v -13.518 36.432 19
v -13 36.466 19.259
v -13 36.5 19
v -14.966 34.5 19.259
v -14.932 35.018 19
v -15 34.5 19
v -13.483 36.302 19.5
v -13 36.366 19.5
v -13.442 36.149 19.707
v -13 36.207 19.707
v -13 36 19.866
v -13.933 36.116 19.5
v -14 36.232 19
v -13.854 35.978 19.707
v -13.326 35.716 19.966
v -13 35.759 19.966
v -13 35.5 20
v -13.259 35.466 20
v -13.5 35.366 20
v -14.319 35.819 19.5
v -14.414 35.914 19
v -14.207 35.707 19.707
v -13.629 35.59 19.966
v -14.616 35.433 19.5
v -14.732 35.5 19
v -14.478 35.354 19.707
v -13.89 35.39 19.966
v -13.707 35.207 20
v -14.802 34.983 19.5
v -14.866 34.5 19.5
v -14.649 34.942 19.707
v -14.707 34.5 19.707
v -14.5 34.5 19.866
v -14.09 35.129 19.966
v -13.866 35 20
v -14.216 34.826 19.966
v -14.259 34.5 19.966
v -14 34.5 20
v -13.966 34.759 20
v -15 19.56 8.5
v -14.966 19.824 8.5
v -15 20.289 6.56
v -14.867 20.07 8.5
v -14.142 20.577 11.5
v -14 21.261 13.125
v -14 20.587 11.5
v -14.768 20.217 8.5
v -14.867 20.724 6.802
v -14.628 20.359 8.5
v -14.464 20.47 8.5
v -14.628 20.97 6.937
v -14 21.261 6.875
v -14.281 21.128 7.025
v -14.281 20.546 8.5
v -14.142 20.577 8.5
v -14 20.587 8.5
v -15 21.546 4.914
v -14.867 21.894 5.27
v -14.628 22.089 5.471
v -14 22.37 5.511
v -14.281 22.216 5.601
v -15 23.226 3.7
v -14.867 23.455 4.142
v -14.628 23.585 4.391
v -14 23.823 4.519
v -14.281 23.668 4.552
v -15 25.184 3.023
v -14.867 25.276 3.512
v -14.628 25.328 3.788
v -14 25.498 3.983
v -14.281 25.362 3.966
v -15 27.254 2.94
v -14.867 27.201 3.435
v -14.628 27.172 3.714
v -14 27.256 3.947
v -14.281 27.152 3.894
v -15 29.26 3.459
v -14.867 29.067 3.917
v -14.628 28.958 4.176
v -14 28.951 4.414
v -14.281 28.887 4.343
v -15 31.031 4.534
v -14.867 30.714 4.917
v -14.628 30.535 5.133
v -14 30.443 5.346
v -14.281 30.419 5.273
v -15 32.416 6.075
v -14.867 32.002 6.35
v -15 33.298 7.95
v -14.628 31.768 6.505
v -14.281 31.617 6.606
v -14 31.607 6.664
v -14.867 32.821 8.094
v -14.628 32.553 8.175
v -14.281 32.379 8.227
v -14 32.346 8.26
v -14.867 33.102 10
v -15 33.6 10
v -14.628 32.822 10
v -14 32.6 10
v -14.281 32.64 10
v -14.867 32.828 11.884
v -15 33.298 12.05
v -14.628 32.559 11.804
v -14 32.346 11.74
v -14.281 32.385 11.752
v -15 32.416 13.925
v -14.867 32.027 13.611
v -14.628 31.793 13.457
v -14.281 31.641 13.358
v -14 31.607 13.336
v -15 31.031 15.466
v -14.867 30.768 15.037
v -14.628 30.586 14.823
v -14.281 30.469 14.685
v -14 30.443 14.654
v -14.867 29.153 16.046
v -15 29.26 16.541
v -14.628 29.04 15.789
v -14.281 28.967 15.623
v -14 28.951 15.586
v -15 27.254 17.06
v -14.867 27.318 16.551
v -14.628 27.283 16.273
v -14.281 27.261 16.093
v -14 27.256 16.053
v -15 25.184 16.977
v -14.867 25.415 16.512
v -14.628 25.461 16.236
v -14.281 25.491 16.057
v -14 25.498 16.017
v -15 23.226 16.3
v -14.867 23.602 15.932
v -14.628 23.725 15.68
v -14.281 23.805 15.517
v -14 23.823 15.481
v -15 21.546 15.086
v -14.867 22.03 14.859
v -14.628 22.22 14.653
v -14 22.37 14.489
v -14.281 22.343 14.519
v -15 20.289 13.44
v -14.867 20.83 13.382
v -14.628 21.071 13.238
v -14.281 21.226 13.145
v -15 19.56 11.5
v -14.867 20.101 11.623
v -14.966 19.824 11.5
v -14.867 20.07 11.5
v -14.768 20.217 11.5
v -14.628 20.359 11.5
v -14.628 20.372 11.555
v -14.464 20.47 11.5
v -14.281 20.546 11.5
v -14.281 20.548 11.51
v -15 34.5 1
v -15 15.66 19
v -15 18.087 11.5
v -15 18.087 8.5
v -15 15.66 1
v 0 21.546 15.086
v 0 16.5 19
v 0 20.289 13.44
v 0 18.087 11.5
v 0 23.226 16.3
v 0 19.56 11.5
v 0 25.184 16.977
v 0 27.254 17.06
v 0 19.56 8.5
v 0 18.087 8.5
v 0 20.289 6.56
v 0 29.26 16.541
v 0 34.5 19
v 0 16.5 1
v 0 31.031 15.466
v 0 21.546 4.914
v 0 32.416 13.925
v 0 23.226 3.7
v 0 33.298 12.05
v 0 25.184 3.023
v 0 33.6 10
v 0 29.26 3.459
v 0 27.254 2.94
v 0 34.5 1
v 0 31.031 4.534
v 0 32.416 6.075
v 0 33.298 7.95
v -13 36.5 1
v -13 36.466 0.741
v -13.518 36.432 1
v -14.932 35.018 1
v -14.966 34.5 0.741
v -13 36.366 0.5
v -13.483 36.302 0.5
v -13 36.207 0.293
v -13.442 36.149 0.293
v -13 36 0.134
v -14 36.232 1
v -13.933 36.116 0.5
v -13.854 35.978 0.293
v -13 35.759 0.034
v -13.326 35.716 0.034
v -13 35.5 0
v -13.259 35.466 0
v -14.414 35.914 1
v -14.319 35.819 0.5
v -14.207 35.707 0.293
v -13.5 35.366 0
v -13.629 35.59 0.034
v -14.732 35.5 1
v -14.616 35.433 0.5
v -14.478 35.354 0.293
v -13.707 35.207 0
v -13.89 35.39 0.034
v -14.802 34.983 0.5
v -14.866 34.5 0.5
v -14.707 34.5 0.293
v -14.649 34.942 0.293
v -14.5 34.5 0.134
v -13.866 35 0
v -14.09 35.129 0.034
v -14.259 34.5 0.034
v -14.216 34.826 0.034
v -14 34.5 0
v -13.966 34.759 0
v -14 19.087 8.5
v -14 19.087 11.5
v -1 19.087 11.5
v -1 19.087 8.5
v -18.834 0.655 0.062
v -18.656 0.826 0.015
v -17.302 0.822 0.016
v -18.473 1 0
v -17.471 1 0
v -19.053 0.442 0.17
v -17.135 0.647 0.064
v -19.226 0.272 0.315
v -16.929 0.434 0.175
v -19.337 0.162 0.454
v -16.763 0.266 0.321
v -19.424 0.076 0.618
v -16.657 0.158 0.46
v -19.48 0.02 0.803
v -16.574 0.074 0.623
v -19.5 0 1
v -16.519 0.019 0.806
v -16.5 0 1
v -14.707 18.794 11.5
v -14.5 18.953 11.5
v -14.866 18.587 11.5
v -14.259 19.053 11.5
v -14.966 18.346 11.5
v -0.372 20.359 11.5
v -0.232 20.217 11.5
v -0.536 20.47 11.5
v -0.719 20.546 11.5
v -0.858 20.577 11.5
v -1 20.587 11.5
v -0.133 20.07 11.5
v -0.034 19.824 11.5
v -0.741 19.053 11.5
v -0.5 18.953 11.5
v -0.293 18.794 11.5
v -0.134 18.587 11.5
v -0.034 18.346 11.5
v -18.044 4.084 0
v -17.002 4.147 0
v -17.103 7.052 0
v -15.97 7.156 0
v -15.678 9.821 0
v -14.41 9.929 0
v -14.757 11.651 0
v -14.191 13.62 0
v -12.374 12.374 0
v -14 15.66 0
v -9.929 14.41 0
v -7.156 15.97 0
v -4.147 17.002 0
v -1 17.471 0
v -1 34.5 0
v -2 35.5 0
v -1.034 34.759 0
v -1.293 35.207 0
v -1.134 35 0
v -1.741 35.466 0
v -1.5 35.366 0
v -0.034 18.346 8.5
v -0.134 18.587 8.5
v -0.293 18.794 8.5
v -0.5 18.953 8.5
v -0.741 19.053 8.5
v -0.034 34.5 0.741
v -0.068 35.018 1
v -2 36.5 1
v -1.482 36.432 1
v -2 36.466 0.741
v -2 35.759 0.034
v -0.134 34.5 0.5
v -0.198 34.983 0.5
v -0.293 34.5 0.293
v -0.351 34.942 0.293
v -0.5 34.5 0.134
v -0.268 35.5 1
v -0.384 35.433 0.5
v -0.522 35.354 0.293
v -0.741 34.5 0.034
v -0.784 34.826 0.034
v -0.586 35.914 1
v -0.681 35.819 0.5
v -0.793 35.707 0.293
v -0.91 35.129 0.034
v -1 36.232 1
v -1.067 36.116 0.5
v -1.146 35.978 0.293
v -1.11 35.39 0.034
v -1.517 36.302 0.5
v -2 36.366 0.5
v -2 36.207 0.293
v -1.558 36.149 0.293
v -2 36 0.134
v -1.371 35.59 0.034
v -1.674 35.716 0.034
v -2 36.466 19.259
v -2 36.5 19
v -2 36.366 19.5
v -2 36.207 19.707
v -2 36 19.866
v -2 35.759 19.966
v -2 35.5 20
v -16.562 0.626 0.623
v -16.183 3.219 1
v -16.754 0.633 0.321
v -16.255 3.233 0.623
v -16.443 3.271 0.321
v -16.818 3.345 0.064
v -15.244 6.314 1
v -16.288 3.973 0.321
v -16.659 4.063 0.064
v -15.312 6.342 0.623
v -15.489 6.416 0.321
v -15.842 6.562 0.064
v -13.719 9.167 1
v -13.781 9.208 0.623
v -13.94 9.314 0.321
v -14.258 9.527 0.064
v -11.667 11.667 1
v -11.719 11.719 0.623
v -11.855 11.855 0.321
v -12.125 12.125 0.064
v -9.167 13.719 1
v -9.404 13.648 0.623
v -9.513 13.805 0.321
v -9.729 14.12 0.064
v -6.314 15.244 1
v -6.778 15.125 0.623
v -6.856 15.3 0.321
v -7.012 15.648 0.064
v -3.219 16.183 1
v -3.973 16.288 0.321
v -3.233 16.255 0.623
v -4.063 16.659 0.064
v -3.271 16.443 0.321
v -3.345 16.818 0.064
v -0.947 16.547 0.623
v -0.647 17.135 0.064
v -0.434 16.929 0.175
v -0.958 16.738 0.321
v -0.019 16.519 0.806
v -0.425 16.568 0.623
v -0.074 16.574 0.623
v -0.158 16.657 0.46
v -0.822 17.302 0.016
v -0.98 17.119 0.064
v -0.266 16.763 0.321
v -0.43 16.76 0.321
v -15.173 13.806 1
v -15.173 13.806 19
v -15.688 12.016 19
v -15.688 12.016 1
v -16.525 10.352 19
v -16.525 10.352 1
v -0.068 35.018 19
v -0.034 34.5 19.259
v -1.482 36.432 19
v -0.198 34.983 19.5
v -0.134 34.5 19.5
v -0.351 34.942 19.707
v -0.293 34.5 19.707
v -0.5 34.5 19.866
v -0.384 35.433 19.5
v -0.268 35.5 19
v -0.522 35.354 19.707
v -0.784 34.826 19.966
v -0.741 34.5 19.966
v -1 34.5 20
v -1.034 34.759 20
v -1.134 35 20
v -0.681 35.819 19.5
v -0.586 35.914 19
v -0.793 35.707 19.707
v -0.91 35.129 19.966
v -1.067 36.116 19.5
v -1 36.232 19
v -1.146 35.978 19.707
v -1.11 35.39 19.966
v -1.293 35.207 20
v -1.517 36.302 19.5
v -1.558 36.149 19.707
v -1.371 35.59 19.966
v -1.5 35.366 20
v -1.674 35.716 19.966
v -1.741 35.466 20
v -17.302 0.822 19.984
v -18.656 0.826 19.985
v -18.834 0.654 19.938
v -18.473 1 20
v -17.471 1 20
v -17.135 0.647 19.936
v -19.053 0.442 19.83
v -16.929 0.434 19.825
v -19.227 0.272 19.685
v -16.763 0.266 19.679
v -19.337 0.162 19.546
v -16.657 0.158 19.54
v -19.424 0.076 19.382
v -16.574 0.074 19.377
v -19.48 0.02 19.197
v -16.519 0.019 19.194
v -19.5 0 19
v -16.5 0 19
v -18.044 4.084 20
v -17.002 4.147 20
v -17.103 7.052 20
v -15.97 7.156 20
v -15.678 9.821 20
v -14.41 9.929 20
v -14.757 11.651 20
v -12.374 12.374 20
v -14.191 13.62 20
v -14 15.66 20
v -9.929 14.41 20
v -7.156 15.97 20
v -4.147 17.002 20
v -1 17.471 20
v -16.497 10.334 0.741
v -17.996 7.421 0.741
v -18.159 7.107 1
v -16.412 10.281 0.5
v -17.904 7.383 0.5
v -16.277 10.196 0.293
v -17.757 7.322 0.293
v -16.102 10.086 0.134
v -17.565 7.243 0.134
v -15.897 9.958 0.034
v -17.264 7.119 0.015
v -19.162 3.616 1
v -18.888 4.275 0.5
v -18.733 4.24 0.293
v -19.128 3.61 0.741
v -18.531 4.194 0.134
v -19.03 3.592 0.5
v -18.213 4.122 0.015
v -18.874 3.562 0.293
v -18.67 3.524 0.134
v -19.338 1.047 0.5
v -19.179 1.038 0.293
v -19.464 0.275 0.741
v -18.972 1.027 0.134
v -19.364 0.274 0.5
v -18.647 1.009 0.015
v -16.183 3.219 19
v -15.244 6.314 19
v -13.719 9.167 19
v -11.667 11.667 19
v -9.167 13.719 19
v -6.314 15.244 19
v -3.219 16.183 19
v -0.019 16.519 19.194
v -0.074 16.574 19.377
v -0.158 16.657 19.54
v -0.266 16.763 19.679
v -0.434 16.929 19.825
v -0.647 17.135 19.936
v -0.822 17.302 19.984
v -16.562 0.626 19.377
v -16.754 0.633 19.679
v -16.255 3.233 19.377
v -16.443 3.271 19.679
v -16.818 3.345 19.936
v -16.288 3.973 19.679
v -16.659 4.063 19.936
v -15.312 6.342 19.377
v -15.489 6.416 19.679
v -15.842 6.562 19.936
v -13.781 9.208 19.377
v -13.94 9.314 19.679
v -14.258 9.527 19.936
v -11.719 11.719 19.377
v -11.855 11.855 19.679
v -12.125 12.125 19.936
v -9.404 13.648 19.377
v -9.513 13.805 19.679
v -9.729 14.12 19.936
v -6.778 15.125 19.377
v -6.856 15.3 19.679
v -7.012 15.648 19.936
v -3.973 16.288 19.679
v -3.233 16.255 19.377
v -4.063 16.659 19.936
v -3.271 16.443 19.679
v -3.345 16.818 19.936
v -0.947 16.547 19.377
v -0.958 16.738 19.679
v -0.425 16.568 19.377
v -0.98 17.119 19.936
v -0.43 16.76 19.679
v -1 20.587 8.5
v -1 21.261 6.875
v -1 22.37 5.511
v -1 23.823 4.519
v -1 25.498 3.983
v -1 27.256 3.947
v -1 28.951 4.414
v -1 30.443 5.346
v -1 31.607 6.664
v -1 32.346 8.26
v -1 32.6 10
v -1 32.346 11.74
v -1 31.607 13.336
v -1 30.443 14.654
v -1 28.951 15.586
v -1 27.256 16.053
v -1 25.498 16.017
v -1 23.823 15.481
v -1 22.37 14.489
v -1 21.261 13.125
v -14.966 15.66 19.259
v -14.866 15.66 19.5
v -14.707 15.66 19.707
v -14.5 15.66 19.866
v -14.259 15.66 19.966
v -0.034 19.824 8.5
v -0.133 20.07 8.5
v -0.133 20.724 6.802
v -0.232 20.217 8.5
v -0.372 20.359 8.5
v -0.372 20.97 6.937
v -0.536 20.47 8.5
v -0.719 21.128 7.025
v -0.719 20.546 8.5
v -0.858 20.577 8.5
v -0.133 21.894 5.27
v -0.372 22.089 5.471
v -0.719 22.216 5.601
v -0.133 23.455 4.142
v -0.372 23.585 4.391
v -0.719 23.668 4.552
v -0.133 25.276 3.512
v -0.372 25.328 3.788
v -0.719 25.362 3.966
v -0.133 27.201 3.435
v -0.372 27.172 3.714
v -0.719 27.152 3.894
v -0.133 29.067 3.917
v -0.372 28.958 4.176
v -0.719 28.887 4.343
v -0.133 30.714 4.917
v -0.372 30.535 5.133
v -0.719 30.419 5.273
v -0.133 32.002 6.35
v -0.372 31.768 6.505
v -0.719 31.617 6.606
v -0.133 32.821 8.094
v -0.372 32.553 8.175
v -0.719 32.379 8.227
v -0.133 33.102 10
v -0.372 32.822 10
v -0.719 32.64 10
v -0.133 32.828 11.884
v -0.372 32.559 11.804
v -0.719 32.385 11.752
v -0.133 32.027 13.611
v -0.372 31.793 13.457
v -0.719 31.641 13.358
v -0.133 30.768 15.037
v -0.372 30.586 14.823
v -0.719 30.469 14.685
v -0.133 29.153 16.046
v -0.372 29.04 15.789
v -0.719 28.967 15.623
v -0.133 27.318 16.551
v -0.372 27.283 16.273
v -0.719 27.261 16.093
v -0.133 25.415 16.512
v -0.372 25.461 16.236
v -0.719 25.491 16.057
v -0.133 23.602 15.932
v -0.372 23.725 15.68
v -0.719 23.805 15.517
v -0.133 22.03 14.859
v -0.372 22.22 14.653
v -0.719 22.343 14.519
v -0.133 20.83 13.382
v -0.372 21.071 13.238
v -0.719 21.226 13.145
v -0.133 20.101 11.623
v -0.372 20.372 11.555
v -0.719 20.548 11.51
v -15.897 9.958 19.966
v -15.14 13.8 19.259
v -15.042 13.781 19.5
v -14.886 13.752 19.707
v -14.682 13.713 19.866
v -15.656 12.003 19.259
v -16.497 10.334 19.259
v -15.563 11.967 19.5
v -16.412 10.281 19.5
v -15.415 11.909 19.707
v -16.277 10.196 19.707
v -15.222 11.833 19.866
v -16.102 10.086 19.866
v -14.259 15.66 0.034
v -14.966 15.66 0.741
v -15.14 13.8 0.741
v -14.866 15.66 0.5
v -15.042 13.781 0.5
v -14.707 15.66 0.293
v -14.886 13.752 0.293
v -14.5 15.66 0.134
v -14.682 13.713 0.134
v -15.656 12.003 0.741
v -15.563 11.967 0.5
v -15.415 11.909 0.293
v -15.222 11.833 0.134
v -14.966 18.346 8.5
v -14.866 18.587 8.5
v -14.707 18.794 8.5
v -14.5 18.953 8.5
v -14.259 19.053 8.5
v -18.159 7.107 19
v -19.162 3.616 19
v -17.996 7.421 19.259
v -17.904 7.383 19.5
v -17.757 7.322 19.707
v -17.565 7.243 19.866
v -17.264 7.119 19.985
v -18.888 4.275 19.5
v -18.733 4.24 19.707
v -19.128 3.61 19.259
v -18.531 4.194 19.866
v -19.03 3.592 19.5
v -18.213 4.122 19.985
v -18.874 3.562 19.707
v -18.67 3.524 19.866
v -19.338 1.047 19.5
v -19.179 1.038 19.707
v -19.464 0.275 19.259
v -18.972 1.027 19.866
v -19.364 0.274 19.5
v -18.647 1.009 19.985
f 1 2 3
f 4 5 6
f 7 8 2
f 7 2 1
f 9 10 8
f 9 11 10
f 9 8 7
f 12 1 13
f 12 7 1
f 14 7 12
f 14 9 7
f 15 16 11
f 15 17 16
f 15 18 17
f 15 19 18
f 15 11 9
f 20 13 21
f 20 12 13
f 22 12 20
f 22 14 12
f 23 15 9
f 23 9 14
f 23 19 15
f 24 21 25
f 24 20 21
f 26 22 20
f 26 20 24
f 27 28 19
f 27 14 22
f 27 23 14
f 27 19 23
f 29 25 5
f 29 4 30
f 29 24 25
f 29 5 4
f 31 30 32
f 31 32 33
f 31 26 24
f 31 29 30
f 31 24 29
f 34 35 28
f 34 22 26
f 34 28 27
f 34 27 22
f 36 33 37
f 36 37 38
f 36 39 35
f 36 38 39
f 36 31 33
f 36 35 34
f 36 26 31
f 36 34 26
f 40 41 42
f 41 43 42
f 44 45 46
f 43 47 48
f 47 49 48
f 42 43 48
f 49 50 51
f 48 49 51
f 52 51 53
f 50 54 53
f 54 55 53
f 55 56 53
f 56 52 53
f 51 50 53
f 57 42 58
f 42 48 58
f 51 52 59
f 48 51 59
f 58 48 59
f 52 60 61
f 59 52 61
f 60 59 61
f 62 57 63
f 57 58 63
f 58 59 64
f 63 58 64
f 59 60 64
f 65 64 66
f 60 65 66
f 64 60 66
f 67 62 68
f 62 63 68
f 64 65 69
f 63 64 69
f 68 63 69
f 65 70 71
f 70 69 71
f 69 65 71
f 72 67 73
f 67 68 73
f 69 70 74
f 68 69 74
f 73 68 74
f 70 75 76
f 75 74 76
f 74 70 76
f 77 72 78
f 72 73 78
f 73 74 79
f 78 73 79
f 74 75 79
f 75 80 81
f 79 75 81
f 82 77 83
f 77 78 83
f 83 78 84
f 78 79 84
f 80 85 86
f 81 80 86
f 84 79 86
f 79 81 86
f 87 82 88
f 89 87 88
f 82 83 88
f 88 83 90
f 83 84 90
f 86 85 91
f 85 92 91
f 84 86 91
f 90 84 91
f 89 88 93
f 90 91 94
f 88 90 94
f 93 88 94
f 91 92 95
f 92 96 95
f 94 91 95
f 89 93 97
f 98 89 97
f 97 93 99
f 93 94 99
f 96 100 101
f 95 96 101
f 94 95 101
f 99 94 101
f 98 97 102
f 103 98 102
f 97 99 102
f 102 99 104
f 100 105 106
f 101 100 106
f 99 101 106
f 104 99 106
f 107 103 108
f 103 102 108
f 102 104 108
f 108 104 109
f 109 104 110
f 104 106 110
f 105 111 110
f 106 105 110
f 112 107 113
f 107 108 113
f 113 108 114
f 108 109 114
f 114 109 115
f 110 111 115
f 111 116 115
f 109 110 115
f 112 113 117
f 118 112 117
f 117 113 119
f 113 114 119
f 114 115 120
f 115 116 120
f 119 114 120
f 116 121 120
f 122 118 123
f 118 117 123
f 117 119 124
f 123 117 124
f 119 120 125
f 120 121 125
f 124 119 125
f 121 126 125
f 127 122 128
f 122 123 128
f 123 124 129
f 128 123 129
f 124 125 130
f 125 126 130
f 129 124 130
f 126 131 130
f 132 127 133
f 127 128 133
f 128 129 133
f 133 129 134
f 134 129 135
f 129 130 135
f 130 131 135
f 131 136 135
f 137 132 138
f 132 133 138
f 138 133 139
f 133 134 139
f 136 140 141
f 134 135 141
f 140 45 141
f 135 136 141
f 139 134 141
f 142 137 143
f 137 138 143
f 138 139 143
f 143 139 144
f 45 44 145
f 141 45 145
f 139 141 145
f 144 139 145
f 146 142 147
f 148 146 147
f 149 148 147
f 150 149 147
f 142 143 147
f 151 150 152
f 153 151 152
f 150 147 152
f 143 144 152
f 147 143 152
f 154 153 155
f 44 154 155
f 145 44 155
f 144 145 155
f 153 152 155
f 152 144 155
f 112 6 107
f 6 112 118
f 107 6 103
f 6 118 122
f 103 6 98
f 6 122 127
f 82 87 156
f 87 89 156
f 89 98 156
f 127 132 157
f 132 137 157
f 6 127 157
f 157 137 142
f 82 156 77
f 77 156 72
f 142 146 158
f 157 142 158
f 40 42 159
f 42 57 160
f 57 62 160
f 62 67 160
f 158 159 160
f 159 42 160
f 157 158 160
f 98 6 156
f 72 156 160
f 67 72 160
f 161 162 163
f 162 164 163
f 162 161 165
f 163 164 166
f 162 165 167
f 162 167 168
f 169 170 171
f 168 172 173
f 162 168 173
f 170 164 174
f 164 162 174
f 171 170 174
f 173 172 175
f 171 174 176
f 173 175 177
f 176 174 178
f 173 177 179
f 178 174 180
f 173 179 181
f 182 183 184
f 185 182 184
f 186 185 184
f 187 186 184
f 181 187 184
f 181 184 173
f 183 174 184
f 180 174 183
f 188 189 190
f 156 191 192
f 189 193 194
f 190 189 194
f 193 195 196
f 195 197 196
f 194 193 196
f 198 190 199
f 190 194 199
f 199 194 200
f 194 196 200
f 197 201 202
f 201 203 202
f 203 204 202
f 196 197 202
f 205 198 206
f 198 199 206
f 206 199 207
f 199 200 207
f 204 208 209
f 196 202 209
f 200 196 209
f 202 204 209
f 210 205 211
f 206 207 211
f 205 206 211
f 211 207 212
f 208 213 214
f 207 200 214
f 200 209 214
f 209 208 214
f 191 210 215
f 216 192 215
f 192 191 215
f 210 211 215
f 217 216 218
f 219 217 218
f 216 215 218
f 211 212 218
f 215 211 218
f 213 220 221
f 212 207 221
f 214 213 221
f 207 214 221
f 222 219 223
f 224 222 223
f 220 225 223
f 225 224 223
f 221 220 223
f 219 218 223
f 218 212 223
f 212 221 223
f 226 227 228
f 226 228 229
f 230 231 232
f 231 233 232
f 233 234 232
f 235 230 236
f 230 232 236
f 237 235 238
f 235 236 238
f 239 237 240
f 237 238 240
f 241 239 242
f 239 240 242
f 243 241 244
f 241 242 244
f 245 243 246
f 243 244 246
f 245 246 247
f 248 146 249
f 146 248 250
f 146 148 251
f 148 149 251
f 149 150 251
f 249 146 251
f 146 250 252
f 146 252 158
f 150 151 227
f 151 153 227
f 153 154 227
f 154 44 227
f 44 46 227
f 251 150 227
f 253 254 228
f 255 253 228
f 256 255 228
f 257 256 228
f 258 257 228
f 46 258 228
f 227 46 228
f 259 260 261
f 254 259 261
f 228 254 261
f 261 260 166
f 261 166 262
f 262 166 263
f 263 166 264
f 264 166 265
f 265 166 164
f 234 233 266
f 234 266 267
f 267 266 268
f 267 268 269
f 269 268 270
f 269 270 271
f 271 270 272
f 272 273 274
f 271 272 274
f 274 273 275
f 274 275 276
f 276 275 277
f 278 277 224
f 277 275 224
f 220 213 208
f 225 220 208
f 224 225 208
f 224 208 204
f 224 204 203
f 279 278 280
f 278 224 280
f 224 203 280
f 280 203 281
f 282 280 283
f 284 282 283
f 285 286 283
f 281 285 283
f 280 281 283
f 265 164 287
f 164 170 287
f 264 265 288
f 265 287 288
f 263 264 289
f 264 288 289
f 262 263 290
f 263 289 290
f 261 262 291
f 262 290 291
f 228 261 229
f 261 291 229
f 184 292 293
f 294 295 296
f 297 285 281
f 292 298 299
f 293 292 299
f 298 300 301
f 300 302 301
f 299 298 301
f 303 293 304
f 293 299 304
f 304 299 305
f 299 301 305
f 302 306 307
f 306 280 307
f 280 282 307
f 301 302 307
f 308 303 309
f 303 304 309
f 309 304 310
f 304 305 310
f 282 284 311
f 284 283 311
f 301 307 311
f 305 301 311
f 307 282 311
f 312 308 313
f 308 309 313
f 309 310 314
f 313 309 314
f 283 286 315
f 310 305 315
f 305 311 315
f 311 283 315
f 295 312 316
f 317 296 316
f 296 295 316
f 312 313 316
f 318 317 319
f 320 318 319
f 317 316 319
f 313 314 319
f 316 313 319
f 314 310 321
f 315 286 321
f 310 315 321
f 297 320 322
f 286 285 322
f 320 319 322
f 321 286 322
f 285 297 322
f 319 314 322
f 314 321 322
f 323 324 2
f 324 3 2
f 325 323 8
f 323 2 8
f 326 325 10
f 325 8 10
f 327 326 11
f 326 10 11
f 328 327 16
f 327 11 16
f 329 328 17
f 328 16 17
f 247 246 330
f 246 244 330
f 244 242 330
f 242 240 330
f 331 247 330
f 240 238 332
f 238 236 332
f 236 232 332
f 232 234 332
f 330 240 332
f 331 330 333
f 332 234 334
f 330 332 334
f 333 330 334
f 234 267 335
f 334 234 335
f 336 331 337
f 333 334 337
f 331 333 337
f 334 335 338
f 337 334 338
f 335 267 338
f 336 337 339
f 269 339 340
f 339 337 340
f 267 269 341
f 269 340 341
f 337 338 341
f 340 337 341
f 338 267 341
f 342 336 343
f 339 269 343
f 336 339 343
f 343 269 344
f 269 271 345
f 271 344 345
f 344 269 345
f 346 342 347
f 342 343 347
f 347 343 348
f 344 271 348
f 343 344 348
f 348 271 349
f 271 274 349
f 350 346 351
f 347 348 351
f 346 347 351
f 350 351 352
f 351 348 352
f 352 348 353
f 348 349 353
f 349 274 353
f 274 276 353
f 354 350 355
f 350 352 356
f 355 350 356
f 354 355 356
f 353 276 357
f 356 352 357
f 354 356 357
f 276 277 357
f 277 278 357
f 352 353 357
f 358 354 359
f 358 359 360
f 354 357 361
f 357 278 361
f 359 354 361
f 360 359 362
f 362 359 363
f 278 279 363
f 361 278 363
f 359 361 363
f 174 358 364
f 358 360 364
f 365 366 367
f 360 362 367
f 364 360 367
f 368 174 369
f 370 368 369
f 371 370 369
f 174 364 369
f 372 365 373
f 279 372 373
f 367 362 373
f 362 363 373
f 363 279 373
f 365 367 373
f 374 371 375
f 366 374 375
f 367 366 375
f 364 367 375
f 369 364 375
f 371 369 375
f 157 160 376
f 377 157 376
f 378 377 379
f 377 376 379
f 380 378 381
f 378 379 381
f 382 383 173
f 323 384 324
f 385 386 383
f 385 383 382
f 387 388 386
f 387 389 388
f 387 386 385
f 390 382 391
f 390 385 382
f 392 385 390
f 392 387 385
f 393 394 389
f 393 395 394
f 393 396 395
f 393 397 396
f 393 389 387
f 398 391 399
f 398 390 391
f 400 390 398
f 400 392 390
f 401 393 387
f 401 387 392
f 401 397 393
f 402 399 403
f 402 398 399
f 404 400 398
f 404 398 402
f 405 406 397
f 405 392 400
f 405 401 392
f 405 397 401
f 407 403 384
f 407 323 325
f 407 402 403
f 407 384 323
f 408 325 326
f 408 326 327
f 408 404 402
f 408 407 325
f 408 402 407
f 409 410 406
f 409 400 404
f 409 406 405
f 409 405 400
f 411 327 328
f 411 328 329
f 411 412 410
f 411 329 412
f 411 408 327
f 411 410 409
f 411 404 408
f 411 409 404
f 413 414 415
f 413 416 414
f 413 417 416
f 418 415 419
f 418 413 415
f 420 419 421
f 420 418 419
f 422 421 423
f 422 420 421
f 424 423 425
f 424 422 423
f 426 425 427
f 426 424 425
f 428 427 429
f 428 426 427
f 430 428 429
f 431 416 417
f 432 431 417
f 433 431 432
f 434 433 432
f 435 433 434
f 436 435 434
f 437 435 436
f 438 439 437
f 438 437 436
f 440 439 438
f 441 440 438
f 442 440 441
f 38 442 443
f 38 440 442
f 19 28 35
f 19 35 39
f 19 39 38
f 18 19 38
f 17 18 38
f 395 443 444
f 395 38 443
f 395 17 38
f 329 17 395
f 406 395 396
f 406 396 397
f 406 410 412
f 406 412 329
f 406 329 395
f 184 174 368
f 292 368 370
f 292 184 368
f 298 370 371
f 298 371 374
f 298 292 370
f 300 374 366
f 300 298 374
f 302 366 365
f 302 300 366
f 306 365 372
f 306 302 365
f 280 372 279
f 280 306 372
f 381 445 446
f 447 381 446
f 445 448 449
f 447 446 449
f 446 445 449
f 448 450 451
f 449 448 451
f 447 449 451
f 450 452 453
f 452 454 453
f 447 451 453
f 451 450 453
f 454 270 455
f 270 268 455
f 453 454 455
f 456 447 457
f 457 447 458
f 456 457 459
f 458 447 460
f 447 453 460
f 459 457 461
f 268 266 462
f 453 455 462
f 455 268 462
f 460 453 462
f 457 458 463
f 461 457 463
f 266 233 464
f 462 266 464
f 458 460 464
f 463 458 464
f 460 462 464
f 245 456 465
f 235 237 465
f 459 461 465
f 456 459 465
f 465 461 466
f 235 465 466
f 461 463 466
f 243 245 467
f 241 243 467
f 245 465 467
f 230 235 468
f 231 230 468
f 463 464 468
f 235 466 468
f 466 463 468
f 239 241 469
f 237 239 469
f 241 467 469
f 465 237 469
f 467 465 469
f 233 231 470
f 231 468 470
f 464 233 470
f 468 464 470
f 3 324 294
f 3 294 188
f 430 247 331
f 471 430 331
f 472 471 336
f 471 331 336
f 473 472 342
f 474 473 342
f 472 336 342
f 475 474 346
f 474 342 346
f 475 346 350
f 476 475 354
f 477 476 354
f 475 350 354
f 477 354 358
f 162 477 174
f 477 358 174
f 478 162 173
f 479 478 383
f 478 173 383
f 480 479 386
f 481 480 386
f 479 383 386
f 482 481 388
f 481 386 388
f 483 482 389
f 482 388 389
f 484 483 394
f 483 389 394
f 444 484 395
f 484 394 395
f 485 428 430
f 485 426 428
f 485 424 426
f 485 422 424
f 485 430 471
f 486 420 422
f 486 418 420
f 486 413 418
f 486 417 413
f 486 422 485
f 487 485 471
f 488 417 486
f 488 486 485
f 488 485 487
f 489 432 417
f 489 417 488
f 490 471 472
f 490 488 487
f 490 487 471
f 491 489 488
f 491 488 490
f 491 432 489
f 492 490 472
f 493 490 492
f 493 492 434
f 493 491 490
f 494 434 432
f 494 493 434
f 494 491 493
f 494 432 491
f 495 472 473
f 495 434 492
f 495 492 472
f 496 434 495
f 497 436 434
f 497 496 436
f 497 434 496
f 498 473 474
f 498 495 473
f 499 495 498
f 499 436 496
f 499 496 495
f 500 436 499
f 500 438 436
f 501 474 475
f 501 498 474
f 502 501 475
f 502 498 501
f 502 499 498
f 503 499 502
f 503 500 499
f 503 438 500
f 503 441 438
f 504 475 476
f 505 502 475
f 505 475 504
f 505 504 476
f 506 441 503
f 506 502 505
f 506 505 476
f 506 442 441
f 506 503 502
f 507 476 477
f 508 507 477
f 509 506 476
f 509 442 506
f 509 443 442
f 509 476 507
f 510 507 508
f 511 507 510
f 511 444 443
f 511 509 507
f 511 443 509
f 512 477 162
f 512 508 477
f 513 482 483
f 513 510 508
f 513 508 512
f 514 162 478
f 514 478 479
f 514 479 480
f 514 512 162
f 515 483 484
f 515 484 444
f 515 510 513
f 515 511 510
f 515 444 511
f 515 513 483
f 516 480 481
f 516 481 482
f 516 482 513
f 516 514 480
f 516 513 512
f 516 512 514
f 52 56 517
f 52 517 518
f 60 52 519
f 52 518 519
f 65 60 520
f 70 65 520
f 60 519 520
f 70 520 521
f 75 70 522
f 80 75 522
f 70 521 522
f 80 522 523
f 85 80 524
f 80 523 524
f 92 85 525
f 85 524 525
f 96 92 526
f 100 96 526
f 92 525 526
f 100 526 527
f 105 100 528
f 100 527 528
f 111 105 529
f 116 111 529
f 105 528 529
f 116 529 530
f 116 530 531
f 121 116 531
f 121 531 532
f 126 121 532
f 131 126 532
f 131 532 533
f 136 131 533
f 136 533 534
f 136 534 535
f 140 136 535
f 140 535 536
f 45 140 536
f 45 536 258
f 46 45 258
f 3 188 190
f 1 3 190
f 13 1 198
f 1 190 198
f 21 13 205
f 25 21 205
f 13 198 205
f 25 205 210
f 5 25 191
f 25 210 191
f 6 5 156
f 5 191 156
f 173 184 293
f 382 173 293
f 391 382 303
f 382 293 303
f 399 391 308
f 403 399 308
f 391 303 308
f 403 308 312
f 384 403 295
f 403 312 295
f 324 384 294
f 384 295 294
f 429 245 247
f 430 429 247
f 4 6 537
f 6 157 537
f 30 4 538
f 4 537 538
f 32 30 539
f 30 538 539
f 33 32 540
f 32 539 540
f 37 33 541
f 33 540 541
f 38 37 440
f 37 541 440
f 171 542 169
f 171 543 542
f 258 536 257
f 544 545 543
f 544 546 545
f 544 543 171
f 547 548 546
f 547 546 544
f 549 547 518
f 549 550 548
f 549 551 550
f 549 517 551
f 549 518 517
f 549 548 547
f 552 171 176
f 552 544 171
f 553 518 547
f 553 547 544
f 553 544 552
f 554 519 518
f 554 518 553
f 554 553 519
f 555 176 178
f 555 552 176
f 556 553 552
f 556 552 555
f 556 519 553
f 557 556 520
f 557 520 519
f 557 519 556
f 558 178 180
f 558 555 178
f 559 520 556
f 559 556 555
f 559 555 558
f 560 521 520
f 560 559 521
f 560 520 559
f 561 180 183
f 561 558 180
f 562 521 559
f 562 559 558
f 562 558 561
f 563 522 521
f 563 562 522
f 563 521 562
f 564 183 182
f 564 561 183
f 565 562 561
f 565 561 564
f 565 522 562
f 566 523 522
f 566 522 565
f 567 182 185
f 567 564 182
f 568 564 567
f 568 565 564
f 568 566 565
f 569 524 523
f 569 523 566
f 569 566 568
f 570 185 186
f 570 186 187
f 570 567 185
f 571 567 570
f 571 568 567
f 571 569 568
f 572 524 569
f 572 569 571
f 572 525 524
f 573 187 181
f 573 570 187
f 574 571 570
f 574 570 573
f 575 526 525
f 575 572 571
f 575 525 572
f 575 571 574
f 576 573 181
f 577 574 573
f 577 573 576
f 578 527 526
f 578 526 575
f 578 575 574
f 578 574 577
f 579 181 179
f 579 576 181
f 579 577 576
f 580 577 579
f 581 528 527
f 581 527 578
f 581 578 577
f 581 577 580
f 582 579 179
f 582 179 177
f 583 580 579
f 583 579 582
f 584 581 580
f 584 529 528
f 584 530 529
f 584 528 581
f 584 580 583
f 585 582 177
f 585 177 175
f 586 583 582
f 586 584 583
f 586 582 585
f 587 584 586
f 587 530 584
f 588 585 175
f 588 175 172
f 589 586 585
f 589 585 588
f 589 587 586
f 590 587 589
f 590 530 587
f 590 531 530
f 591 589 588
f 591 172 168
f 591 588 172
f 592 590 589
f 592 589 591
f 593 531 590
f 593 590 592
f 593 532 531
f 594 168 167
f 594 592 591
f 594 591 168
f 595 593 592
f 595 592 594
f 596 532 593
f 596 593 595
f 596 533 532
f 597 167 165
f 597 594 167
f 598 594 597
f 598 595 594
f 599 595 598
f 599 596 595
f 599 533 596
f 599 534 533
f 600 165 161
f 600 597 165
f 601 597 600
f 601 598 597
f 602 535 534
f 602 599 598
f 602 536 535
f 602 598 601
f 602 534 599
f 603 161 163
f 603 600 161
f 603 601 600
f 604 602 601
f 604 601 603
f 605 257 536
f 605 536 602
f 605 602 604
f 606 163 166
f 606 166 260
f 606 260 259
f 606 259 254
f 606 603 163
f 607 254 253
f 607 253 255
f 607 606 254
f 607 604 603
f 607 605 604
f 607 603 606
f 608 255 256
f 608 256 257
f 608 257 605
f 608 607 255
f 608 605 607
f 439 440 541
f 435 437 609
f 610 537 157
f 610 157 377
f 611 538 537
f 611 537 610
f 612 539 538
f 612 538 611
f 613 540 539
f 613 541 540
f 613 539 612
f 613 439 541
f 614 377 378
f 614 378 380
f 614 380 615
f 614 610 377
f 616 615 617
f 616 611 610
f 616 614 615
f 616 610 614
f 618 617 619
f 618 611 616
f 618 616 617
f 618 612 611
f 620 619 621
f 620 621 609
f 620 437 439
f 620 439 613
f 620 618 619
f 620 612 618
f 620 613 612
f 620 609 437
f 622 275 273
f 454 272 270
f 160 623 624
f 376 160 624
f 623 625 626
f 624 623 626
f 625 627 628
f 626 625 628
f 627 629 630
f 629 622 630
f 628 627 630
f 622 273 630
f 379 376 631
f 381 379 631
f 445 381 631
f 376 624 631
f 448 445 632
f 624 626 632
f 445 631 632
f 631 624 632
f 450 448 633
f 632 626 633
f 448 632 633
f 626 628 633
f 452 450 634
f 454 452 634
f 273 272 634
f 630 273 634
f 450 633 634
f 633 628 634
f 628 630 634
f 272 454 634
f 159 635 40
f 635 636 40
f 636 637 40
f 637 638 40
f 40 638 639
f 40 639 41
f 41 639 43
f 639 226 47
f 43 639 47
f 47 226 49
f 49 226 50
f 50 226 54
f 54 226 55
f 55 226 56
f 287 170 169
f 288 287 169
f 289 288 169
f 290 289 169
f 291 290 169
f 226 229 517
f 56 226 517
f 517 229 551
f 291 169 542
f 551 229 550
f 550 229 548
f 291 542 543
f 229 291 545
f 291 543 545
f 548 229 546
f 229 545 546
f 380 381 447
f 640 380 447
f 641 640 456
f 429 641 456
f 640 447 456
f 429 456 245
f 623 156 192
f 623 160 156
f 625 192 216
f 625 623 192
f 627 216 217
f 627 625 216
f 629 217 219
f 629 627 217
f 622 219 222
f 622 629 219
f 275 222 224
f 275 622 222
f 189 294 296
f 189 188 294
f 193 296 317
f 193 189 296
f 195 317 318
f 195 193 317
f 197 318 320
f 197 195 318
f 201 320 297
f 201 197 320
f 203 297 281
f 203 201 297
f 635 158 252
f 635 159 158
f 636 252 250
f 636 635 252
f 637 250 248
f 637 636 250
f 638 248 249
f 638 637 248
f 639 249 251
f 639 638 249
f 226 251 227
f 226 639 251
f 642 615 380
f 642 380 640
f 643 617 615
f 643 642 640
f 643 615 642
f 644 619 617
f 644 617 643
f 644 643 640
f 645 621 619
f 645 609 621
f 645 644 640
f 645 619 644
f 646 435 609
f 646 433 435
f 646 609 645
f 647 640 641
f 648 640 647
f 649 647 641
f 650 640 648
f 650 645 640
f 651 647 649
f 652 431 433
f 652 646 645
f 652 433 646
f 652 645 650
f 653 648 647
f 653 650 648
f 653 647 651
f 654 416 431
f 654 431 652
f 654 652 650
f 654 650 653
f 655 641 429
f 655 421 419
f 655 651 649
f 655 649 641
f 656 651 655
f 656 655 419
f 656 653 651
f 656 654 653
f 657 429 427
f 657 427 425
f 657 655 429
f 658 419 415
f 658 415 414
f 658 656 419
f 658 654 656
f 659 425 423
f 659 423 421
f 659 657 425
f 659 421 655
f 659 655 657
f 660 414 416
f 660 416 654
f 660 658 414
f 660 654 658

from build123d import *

# Parameters (mm, degrees)
BOSS_EXTRUDE1_DEPTH = 20
CUT_EXTRUDE1_DEPTH  = 46.961940777
FILLET1_R           = 1
FILLET2_R           = 1
FILLET3_R           = 1


with BuildPart() as part:
    # Sketch1 → Boss-Extrude1 (new body)
    with BuildSketch(Plane.XY):
        with BuildLine():
            Line((-19.5, 0), (-16.5, 0))
            ThreePointArc((-16.5, 0), (-11.66726189, 11.66726189), (0, 16.5))
            Line((0, 16.5), (0, 34.5))
            ThreePointArc((0, 34.5), (-0.585786438, 35.914213562), (-2, 36.5))
            Line((-2, 36.5), (-13, 36.5))
            ThreePointArc((-13, 36.5), (-14.414213562, 35.914213562), (-15, 34.5))
            Line((-15, 34.5), (-15, 15.660459763))
            ThreePointArc((-15, 15.660459763), (-15.388918825, 12.89873591), (-16.525423729, 10.351829335))
            ThreePointArc((-16.525423729, 10.351829335), (-18.741608292, 5.385361515), (-19.5, 0))
        make_face()
    extrude(amount=BOSS_EXTRUDE1_DEPTH)

    # Sketch2 → Cut-Extrude1 (cut, through all)
    with BuildSketch(Plane(origin=(0, 0, 0), x_dir=(0, 0, -1), z_dir=(1, 0, 0))):
        with BuildLine():
            Line((-11.5, 19.0873018), (-8.5, 19.0873018))
            Line((-8.5, 19.0873018), (-8.5, 20.5873018))
            ThreePointArc((-8.5, 20.5873018), (-10, 32.6), (-11.5, 20.5873018))
            Line((-11.5, 20.5873018), (-11.5, 19.0873018))
        make_face()
    extrude(amount=-CUT_EXTRUDE1_DEPTH, mode=Mode.SUBTRACT)

    # Fillet1
    fillet1_edges = [part.edges().sort_by_distance(p)[0] for p in [
        (-15, 19.0873018, 10),
        (0, 19.0873018, 10),
    ]]
    fillet(fillet1_edges, radius=FILLET1_R)

    # Fillet2
    fillet2_edges = [part.edges().sort_by_distance(p)[0] for p in [
        (-15, 32.6, 10),
        (0, 32.6, 10),
    ]]
    fillet(fillet2_edges, radius=FILLET2_R)

    # Fillet3
    fillet3_edges = [part.edges().sort_by_distance(p)[0] for p in [
        (-11.66726189, 11.66726189, 20),
        (-0.585786438, 35.914213562, 0),
        (0, 25.5, 0),
        (-11.66726189, 11.66726189, 0),
        (-18, 0, 0),
        (-18.741608292, 5.385361515, 0),
        (0, 25.5, 20),
        (-0.585786438, 35.914213562, 20),
        (-7.5, 36.5, 20),
        (-14.414213562, 35.914213562, 20),
        (-15, 25.080229882, 20),
        (-15.388918825, 12.89873591, 20),
        (-18.741608292, 5.385361515, 20),
        (-18, 0, 20),
        (-15.388918825, 12.89873591, 0),
        (-15, 25.080229882, 0),
        (-14.414213562, 35.914213562, 0),
        (-7.5, 36.5, 0),
    ]]
    fillet(fillet3_edges, radius=FILLET3_R)


solid = part.part
